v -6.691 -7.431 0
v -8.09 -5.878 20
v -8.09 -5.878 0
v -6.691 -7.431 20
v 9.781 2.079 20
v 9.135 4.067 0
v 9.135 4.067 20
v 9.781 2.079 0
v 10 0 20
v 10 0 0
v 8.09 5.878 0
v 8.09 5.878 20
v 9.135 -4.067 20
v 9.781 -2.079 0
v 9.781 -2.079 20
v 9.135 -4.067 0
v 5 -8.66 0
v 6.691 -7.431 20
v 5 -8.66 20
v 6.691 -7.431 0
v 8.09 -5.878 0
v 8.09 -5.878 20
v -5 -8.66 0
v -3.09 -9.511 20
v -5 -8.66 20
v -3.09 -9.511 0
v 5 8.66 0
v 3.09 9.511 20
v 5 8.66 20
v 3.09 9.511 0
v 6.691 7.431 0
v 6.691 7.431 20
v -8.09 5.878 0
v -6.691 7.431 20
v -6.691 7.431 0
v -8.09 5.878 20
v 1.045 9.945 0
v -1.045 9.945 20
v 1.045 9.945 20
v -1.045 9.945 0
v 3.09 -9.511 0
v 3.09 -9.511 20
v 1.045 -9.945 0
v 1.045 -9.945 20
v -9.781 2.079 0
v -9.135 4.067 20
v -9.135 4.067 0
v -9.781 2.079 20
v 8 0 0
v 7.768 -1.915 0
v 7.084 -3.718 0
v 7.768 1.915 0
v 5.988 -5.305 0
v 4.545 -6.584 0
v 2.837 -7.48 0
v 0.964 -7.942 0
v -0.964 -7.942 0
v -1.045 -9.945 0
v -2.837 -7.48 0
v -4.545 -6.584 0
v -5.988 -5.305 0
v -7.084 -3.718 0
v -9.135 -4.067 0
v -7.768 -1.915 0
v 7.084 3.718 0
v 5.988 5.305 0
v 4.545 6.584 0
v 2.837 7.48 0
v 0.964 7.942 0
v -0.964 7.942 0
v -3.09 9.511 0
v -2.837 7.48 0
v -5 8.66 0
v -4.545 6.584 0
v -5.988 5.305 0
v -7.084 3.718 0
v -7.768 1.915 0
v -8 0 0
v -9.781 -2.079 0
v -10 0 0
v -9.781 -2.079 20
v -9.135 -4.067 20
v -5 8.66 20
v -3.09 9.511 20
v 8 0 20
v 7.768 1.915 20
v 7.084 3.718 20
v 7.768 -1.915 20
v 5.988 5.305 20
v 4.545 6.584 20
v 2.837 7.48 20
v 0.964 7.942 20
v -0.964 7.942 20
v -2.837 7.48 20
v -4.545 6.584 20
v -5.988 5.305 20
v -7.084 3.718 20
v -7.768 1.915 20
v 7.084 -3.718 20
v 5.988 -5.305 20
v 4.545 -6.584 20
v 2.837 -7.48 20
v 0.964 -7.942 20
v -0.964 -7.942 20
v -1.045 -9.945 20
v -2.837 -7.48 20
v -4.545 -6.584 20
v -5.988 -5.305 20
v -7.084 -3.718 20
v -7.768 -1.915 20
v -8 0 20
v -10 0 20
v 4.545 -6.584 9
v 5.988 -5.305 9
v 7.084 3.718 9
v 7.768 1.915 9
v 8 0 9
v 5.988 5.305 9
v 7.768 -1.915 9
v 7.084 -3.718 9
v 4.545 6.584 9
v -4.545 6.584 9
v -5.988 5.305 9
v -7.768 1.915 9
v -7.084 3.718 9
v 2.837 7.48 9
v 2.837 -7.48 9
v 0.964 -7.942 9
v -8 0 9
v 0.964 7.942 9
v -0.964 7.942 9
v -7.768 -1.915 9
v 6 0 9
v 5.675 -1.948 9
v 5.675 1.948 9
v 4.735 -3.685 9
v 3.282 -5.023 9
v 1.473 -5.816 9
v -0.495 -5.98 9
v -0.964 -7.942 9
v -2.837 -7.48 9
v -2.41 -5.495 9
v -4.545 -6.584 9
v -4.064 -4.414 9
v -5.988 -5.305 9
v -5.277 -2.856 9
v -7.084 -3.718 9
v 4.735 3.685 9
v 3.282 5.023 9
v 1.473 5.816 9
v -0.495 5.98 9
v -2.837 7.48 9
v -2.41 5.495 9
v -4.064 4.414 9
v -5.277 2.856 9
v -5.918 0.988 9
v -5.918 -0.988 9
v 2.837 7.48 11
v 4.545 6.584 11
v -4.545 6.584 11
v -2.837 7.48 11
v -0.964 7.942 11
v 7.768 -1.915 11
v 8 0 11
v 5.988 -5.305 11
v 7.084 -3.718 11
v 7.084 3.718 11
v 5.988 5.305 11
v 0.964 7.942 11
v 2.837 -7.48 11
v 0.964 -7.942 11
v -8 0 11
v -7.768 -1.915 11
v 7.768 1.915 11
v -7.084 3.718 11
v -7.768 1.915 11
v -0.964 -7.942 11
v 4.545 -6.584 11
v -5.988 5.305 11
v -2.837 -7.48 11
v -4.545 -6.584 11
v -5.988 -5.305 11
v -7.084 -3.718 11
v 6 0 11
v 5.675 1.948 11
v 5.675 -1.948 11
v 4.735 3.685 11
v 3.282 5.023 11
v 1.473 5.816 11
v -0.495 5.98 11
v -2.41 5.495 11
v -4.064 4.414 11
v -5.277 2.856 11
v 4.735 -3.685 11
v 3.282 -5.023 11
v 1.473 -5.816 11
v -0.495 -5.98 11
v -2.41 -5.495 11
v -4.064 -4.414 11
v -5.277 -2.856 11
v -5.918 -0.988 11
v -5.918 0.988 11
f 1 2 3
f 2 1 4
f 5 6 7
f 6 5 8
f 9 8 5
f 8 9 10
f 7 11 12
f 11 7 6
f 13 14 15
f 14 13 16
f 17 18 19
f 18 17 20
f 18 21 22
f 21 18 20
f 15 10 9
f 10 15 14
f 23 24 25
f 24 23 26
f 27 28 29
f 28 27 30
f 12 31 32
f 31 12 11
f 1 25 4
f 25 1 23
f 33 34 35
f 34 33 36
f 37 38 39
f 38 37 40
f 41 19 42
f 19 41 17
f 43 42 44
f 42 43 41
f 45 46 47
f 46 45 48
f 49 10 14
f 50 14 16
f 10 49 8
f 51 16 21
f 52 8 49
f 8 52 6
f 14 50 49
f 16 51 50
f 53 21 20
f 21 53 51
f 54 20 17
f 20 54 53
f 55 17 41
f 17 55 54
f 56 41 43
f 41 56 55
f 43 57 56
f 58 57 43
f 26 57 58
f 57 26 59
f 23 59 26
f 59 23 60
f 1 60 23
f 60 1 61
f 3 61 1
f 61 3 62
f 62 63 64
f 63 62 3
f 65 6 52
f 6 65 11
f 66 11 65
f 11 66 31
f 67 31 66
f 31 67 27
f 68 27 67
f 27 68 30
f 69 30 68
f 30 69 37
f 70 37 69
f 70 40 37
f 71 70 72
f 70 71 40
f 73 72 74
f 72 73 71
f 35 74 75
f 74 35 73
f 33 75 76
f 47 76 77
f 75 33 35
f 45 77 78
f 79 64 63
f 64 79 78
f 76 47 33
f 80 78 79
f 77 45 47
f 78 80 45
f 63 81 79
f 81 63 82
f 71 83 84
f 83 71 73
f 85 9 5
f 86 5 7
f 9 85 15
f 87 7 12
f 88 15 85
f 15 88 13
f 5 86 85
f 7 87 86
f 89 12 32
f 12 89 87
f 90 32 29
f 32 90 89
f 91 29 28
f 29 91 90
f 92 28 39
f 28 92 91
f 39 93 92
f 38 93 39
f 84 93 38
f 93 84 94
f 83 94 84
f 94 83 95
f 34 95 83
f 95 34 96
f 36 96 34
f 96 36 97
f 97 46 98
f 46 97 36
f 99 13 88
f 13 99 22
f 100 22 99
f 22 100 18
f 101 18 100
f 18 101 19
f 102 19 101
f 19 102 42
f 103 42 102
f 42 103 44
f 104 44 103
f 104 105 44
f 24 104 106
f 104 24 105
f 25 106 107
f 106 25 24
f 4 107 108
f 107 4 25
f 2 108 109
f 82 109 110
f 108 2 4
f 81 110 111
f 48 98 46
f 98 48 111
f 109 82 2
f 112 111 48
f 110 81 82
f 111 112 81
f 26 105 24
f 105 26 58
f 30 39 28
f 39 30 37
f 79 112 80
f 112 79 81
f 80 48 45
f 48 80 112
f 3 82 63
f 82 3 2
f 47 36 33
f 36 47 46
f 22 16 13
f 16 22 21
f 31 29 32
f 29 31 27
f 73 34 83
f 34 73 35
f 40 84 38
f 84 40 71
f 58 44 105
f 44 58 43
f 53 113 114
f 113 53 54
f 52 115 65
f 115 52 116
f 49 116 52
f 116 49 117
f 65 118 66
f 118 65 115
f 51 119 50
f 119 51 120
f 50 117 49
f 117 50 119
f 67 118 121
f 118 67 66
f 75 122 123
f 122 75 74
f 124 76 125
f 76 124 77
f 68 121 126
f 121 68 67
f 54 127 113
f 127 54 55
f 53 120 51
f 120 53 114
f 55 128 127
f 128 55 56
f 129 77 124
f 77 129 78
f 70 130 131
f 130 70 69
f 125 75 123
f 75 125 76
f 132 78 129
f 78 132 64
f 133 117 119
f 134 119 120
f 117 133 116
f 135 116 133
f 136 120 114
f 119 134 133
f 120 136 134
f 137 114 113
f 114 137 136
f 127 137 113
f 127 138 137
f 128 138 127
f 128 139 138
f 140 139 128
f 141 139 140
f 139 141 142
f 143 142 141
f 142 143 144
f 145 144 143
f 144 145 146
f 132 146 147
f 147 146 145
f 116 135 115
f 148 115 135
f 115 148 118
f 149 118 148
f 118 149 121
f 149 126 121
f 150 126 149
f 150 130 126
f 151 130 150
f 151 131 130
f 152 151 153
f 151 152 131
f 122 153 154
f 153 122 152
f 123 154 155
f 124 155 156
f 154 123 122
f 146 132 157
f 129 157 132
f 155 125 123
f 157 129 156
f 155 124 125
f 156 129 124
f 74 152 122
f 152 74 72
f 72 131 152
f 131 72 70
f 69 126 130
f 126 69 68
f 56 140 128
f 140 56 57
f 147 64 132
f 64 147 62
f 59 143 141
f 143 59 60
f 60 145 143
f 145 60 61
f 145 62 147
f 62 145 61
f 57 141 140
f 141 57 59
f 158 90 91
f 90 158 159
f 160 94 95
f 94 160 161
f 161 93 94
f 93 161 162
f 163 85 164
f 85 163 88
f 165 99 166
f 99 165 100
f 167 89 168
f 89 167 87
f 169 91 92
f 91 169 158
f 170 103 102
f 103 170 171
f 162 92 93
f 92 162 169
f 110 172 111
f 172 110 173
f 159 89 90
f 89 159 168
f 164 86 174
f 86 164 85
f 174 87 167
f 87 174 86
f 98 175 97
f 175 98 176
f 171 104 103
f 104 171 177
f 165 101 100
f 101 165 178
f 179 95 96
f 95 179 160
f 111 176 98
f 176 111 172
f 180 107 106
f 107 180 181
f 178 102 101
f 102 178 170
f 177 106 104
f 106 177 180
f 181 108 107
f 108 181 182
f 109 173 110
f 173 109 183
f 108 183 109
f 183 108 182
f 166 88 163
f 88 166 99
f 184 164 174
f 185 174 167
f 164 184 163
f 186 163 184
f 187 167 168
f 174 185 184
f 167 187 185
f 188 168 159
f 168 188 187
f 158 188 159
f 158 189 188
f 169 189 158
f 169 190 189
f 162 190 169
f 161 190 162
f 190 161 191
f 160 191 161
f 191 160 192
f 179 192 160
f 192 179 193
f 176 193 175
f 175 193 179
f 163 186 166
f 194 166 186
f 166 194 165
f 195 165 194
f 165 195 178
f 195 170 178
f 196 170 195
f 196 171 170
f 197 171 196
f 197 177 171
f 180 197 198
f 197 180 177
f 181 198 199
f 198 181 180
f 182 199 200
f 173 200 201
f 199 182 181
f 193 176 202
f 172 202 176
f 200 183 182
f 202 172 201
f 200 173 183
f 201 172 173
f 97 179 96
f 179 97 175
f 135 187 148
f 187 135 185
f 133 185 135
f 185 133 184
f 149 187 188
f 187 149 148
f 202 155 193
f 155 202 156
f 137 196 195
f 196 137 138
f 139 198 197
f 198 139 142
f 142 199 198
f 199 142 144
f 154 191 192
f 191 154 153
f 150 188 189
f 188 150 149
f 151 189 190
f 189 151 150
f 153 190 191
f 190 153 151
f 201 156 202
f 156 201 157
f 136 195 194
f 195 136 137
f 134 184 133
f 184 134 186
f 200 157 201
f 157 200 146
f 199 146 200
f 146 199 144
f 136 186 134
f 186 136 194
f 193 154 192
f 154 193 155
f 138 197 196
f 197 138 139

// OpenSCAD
difference()
{
    cylinder(h=20,r=10);
    translate([0,0,-1])
        cylinder(h=10,r=8);
    translate([0,0,11])
        cylinder(h=10,r=8);
    translate([0,0,8])
        cylinder(h=4,r=6);
}
